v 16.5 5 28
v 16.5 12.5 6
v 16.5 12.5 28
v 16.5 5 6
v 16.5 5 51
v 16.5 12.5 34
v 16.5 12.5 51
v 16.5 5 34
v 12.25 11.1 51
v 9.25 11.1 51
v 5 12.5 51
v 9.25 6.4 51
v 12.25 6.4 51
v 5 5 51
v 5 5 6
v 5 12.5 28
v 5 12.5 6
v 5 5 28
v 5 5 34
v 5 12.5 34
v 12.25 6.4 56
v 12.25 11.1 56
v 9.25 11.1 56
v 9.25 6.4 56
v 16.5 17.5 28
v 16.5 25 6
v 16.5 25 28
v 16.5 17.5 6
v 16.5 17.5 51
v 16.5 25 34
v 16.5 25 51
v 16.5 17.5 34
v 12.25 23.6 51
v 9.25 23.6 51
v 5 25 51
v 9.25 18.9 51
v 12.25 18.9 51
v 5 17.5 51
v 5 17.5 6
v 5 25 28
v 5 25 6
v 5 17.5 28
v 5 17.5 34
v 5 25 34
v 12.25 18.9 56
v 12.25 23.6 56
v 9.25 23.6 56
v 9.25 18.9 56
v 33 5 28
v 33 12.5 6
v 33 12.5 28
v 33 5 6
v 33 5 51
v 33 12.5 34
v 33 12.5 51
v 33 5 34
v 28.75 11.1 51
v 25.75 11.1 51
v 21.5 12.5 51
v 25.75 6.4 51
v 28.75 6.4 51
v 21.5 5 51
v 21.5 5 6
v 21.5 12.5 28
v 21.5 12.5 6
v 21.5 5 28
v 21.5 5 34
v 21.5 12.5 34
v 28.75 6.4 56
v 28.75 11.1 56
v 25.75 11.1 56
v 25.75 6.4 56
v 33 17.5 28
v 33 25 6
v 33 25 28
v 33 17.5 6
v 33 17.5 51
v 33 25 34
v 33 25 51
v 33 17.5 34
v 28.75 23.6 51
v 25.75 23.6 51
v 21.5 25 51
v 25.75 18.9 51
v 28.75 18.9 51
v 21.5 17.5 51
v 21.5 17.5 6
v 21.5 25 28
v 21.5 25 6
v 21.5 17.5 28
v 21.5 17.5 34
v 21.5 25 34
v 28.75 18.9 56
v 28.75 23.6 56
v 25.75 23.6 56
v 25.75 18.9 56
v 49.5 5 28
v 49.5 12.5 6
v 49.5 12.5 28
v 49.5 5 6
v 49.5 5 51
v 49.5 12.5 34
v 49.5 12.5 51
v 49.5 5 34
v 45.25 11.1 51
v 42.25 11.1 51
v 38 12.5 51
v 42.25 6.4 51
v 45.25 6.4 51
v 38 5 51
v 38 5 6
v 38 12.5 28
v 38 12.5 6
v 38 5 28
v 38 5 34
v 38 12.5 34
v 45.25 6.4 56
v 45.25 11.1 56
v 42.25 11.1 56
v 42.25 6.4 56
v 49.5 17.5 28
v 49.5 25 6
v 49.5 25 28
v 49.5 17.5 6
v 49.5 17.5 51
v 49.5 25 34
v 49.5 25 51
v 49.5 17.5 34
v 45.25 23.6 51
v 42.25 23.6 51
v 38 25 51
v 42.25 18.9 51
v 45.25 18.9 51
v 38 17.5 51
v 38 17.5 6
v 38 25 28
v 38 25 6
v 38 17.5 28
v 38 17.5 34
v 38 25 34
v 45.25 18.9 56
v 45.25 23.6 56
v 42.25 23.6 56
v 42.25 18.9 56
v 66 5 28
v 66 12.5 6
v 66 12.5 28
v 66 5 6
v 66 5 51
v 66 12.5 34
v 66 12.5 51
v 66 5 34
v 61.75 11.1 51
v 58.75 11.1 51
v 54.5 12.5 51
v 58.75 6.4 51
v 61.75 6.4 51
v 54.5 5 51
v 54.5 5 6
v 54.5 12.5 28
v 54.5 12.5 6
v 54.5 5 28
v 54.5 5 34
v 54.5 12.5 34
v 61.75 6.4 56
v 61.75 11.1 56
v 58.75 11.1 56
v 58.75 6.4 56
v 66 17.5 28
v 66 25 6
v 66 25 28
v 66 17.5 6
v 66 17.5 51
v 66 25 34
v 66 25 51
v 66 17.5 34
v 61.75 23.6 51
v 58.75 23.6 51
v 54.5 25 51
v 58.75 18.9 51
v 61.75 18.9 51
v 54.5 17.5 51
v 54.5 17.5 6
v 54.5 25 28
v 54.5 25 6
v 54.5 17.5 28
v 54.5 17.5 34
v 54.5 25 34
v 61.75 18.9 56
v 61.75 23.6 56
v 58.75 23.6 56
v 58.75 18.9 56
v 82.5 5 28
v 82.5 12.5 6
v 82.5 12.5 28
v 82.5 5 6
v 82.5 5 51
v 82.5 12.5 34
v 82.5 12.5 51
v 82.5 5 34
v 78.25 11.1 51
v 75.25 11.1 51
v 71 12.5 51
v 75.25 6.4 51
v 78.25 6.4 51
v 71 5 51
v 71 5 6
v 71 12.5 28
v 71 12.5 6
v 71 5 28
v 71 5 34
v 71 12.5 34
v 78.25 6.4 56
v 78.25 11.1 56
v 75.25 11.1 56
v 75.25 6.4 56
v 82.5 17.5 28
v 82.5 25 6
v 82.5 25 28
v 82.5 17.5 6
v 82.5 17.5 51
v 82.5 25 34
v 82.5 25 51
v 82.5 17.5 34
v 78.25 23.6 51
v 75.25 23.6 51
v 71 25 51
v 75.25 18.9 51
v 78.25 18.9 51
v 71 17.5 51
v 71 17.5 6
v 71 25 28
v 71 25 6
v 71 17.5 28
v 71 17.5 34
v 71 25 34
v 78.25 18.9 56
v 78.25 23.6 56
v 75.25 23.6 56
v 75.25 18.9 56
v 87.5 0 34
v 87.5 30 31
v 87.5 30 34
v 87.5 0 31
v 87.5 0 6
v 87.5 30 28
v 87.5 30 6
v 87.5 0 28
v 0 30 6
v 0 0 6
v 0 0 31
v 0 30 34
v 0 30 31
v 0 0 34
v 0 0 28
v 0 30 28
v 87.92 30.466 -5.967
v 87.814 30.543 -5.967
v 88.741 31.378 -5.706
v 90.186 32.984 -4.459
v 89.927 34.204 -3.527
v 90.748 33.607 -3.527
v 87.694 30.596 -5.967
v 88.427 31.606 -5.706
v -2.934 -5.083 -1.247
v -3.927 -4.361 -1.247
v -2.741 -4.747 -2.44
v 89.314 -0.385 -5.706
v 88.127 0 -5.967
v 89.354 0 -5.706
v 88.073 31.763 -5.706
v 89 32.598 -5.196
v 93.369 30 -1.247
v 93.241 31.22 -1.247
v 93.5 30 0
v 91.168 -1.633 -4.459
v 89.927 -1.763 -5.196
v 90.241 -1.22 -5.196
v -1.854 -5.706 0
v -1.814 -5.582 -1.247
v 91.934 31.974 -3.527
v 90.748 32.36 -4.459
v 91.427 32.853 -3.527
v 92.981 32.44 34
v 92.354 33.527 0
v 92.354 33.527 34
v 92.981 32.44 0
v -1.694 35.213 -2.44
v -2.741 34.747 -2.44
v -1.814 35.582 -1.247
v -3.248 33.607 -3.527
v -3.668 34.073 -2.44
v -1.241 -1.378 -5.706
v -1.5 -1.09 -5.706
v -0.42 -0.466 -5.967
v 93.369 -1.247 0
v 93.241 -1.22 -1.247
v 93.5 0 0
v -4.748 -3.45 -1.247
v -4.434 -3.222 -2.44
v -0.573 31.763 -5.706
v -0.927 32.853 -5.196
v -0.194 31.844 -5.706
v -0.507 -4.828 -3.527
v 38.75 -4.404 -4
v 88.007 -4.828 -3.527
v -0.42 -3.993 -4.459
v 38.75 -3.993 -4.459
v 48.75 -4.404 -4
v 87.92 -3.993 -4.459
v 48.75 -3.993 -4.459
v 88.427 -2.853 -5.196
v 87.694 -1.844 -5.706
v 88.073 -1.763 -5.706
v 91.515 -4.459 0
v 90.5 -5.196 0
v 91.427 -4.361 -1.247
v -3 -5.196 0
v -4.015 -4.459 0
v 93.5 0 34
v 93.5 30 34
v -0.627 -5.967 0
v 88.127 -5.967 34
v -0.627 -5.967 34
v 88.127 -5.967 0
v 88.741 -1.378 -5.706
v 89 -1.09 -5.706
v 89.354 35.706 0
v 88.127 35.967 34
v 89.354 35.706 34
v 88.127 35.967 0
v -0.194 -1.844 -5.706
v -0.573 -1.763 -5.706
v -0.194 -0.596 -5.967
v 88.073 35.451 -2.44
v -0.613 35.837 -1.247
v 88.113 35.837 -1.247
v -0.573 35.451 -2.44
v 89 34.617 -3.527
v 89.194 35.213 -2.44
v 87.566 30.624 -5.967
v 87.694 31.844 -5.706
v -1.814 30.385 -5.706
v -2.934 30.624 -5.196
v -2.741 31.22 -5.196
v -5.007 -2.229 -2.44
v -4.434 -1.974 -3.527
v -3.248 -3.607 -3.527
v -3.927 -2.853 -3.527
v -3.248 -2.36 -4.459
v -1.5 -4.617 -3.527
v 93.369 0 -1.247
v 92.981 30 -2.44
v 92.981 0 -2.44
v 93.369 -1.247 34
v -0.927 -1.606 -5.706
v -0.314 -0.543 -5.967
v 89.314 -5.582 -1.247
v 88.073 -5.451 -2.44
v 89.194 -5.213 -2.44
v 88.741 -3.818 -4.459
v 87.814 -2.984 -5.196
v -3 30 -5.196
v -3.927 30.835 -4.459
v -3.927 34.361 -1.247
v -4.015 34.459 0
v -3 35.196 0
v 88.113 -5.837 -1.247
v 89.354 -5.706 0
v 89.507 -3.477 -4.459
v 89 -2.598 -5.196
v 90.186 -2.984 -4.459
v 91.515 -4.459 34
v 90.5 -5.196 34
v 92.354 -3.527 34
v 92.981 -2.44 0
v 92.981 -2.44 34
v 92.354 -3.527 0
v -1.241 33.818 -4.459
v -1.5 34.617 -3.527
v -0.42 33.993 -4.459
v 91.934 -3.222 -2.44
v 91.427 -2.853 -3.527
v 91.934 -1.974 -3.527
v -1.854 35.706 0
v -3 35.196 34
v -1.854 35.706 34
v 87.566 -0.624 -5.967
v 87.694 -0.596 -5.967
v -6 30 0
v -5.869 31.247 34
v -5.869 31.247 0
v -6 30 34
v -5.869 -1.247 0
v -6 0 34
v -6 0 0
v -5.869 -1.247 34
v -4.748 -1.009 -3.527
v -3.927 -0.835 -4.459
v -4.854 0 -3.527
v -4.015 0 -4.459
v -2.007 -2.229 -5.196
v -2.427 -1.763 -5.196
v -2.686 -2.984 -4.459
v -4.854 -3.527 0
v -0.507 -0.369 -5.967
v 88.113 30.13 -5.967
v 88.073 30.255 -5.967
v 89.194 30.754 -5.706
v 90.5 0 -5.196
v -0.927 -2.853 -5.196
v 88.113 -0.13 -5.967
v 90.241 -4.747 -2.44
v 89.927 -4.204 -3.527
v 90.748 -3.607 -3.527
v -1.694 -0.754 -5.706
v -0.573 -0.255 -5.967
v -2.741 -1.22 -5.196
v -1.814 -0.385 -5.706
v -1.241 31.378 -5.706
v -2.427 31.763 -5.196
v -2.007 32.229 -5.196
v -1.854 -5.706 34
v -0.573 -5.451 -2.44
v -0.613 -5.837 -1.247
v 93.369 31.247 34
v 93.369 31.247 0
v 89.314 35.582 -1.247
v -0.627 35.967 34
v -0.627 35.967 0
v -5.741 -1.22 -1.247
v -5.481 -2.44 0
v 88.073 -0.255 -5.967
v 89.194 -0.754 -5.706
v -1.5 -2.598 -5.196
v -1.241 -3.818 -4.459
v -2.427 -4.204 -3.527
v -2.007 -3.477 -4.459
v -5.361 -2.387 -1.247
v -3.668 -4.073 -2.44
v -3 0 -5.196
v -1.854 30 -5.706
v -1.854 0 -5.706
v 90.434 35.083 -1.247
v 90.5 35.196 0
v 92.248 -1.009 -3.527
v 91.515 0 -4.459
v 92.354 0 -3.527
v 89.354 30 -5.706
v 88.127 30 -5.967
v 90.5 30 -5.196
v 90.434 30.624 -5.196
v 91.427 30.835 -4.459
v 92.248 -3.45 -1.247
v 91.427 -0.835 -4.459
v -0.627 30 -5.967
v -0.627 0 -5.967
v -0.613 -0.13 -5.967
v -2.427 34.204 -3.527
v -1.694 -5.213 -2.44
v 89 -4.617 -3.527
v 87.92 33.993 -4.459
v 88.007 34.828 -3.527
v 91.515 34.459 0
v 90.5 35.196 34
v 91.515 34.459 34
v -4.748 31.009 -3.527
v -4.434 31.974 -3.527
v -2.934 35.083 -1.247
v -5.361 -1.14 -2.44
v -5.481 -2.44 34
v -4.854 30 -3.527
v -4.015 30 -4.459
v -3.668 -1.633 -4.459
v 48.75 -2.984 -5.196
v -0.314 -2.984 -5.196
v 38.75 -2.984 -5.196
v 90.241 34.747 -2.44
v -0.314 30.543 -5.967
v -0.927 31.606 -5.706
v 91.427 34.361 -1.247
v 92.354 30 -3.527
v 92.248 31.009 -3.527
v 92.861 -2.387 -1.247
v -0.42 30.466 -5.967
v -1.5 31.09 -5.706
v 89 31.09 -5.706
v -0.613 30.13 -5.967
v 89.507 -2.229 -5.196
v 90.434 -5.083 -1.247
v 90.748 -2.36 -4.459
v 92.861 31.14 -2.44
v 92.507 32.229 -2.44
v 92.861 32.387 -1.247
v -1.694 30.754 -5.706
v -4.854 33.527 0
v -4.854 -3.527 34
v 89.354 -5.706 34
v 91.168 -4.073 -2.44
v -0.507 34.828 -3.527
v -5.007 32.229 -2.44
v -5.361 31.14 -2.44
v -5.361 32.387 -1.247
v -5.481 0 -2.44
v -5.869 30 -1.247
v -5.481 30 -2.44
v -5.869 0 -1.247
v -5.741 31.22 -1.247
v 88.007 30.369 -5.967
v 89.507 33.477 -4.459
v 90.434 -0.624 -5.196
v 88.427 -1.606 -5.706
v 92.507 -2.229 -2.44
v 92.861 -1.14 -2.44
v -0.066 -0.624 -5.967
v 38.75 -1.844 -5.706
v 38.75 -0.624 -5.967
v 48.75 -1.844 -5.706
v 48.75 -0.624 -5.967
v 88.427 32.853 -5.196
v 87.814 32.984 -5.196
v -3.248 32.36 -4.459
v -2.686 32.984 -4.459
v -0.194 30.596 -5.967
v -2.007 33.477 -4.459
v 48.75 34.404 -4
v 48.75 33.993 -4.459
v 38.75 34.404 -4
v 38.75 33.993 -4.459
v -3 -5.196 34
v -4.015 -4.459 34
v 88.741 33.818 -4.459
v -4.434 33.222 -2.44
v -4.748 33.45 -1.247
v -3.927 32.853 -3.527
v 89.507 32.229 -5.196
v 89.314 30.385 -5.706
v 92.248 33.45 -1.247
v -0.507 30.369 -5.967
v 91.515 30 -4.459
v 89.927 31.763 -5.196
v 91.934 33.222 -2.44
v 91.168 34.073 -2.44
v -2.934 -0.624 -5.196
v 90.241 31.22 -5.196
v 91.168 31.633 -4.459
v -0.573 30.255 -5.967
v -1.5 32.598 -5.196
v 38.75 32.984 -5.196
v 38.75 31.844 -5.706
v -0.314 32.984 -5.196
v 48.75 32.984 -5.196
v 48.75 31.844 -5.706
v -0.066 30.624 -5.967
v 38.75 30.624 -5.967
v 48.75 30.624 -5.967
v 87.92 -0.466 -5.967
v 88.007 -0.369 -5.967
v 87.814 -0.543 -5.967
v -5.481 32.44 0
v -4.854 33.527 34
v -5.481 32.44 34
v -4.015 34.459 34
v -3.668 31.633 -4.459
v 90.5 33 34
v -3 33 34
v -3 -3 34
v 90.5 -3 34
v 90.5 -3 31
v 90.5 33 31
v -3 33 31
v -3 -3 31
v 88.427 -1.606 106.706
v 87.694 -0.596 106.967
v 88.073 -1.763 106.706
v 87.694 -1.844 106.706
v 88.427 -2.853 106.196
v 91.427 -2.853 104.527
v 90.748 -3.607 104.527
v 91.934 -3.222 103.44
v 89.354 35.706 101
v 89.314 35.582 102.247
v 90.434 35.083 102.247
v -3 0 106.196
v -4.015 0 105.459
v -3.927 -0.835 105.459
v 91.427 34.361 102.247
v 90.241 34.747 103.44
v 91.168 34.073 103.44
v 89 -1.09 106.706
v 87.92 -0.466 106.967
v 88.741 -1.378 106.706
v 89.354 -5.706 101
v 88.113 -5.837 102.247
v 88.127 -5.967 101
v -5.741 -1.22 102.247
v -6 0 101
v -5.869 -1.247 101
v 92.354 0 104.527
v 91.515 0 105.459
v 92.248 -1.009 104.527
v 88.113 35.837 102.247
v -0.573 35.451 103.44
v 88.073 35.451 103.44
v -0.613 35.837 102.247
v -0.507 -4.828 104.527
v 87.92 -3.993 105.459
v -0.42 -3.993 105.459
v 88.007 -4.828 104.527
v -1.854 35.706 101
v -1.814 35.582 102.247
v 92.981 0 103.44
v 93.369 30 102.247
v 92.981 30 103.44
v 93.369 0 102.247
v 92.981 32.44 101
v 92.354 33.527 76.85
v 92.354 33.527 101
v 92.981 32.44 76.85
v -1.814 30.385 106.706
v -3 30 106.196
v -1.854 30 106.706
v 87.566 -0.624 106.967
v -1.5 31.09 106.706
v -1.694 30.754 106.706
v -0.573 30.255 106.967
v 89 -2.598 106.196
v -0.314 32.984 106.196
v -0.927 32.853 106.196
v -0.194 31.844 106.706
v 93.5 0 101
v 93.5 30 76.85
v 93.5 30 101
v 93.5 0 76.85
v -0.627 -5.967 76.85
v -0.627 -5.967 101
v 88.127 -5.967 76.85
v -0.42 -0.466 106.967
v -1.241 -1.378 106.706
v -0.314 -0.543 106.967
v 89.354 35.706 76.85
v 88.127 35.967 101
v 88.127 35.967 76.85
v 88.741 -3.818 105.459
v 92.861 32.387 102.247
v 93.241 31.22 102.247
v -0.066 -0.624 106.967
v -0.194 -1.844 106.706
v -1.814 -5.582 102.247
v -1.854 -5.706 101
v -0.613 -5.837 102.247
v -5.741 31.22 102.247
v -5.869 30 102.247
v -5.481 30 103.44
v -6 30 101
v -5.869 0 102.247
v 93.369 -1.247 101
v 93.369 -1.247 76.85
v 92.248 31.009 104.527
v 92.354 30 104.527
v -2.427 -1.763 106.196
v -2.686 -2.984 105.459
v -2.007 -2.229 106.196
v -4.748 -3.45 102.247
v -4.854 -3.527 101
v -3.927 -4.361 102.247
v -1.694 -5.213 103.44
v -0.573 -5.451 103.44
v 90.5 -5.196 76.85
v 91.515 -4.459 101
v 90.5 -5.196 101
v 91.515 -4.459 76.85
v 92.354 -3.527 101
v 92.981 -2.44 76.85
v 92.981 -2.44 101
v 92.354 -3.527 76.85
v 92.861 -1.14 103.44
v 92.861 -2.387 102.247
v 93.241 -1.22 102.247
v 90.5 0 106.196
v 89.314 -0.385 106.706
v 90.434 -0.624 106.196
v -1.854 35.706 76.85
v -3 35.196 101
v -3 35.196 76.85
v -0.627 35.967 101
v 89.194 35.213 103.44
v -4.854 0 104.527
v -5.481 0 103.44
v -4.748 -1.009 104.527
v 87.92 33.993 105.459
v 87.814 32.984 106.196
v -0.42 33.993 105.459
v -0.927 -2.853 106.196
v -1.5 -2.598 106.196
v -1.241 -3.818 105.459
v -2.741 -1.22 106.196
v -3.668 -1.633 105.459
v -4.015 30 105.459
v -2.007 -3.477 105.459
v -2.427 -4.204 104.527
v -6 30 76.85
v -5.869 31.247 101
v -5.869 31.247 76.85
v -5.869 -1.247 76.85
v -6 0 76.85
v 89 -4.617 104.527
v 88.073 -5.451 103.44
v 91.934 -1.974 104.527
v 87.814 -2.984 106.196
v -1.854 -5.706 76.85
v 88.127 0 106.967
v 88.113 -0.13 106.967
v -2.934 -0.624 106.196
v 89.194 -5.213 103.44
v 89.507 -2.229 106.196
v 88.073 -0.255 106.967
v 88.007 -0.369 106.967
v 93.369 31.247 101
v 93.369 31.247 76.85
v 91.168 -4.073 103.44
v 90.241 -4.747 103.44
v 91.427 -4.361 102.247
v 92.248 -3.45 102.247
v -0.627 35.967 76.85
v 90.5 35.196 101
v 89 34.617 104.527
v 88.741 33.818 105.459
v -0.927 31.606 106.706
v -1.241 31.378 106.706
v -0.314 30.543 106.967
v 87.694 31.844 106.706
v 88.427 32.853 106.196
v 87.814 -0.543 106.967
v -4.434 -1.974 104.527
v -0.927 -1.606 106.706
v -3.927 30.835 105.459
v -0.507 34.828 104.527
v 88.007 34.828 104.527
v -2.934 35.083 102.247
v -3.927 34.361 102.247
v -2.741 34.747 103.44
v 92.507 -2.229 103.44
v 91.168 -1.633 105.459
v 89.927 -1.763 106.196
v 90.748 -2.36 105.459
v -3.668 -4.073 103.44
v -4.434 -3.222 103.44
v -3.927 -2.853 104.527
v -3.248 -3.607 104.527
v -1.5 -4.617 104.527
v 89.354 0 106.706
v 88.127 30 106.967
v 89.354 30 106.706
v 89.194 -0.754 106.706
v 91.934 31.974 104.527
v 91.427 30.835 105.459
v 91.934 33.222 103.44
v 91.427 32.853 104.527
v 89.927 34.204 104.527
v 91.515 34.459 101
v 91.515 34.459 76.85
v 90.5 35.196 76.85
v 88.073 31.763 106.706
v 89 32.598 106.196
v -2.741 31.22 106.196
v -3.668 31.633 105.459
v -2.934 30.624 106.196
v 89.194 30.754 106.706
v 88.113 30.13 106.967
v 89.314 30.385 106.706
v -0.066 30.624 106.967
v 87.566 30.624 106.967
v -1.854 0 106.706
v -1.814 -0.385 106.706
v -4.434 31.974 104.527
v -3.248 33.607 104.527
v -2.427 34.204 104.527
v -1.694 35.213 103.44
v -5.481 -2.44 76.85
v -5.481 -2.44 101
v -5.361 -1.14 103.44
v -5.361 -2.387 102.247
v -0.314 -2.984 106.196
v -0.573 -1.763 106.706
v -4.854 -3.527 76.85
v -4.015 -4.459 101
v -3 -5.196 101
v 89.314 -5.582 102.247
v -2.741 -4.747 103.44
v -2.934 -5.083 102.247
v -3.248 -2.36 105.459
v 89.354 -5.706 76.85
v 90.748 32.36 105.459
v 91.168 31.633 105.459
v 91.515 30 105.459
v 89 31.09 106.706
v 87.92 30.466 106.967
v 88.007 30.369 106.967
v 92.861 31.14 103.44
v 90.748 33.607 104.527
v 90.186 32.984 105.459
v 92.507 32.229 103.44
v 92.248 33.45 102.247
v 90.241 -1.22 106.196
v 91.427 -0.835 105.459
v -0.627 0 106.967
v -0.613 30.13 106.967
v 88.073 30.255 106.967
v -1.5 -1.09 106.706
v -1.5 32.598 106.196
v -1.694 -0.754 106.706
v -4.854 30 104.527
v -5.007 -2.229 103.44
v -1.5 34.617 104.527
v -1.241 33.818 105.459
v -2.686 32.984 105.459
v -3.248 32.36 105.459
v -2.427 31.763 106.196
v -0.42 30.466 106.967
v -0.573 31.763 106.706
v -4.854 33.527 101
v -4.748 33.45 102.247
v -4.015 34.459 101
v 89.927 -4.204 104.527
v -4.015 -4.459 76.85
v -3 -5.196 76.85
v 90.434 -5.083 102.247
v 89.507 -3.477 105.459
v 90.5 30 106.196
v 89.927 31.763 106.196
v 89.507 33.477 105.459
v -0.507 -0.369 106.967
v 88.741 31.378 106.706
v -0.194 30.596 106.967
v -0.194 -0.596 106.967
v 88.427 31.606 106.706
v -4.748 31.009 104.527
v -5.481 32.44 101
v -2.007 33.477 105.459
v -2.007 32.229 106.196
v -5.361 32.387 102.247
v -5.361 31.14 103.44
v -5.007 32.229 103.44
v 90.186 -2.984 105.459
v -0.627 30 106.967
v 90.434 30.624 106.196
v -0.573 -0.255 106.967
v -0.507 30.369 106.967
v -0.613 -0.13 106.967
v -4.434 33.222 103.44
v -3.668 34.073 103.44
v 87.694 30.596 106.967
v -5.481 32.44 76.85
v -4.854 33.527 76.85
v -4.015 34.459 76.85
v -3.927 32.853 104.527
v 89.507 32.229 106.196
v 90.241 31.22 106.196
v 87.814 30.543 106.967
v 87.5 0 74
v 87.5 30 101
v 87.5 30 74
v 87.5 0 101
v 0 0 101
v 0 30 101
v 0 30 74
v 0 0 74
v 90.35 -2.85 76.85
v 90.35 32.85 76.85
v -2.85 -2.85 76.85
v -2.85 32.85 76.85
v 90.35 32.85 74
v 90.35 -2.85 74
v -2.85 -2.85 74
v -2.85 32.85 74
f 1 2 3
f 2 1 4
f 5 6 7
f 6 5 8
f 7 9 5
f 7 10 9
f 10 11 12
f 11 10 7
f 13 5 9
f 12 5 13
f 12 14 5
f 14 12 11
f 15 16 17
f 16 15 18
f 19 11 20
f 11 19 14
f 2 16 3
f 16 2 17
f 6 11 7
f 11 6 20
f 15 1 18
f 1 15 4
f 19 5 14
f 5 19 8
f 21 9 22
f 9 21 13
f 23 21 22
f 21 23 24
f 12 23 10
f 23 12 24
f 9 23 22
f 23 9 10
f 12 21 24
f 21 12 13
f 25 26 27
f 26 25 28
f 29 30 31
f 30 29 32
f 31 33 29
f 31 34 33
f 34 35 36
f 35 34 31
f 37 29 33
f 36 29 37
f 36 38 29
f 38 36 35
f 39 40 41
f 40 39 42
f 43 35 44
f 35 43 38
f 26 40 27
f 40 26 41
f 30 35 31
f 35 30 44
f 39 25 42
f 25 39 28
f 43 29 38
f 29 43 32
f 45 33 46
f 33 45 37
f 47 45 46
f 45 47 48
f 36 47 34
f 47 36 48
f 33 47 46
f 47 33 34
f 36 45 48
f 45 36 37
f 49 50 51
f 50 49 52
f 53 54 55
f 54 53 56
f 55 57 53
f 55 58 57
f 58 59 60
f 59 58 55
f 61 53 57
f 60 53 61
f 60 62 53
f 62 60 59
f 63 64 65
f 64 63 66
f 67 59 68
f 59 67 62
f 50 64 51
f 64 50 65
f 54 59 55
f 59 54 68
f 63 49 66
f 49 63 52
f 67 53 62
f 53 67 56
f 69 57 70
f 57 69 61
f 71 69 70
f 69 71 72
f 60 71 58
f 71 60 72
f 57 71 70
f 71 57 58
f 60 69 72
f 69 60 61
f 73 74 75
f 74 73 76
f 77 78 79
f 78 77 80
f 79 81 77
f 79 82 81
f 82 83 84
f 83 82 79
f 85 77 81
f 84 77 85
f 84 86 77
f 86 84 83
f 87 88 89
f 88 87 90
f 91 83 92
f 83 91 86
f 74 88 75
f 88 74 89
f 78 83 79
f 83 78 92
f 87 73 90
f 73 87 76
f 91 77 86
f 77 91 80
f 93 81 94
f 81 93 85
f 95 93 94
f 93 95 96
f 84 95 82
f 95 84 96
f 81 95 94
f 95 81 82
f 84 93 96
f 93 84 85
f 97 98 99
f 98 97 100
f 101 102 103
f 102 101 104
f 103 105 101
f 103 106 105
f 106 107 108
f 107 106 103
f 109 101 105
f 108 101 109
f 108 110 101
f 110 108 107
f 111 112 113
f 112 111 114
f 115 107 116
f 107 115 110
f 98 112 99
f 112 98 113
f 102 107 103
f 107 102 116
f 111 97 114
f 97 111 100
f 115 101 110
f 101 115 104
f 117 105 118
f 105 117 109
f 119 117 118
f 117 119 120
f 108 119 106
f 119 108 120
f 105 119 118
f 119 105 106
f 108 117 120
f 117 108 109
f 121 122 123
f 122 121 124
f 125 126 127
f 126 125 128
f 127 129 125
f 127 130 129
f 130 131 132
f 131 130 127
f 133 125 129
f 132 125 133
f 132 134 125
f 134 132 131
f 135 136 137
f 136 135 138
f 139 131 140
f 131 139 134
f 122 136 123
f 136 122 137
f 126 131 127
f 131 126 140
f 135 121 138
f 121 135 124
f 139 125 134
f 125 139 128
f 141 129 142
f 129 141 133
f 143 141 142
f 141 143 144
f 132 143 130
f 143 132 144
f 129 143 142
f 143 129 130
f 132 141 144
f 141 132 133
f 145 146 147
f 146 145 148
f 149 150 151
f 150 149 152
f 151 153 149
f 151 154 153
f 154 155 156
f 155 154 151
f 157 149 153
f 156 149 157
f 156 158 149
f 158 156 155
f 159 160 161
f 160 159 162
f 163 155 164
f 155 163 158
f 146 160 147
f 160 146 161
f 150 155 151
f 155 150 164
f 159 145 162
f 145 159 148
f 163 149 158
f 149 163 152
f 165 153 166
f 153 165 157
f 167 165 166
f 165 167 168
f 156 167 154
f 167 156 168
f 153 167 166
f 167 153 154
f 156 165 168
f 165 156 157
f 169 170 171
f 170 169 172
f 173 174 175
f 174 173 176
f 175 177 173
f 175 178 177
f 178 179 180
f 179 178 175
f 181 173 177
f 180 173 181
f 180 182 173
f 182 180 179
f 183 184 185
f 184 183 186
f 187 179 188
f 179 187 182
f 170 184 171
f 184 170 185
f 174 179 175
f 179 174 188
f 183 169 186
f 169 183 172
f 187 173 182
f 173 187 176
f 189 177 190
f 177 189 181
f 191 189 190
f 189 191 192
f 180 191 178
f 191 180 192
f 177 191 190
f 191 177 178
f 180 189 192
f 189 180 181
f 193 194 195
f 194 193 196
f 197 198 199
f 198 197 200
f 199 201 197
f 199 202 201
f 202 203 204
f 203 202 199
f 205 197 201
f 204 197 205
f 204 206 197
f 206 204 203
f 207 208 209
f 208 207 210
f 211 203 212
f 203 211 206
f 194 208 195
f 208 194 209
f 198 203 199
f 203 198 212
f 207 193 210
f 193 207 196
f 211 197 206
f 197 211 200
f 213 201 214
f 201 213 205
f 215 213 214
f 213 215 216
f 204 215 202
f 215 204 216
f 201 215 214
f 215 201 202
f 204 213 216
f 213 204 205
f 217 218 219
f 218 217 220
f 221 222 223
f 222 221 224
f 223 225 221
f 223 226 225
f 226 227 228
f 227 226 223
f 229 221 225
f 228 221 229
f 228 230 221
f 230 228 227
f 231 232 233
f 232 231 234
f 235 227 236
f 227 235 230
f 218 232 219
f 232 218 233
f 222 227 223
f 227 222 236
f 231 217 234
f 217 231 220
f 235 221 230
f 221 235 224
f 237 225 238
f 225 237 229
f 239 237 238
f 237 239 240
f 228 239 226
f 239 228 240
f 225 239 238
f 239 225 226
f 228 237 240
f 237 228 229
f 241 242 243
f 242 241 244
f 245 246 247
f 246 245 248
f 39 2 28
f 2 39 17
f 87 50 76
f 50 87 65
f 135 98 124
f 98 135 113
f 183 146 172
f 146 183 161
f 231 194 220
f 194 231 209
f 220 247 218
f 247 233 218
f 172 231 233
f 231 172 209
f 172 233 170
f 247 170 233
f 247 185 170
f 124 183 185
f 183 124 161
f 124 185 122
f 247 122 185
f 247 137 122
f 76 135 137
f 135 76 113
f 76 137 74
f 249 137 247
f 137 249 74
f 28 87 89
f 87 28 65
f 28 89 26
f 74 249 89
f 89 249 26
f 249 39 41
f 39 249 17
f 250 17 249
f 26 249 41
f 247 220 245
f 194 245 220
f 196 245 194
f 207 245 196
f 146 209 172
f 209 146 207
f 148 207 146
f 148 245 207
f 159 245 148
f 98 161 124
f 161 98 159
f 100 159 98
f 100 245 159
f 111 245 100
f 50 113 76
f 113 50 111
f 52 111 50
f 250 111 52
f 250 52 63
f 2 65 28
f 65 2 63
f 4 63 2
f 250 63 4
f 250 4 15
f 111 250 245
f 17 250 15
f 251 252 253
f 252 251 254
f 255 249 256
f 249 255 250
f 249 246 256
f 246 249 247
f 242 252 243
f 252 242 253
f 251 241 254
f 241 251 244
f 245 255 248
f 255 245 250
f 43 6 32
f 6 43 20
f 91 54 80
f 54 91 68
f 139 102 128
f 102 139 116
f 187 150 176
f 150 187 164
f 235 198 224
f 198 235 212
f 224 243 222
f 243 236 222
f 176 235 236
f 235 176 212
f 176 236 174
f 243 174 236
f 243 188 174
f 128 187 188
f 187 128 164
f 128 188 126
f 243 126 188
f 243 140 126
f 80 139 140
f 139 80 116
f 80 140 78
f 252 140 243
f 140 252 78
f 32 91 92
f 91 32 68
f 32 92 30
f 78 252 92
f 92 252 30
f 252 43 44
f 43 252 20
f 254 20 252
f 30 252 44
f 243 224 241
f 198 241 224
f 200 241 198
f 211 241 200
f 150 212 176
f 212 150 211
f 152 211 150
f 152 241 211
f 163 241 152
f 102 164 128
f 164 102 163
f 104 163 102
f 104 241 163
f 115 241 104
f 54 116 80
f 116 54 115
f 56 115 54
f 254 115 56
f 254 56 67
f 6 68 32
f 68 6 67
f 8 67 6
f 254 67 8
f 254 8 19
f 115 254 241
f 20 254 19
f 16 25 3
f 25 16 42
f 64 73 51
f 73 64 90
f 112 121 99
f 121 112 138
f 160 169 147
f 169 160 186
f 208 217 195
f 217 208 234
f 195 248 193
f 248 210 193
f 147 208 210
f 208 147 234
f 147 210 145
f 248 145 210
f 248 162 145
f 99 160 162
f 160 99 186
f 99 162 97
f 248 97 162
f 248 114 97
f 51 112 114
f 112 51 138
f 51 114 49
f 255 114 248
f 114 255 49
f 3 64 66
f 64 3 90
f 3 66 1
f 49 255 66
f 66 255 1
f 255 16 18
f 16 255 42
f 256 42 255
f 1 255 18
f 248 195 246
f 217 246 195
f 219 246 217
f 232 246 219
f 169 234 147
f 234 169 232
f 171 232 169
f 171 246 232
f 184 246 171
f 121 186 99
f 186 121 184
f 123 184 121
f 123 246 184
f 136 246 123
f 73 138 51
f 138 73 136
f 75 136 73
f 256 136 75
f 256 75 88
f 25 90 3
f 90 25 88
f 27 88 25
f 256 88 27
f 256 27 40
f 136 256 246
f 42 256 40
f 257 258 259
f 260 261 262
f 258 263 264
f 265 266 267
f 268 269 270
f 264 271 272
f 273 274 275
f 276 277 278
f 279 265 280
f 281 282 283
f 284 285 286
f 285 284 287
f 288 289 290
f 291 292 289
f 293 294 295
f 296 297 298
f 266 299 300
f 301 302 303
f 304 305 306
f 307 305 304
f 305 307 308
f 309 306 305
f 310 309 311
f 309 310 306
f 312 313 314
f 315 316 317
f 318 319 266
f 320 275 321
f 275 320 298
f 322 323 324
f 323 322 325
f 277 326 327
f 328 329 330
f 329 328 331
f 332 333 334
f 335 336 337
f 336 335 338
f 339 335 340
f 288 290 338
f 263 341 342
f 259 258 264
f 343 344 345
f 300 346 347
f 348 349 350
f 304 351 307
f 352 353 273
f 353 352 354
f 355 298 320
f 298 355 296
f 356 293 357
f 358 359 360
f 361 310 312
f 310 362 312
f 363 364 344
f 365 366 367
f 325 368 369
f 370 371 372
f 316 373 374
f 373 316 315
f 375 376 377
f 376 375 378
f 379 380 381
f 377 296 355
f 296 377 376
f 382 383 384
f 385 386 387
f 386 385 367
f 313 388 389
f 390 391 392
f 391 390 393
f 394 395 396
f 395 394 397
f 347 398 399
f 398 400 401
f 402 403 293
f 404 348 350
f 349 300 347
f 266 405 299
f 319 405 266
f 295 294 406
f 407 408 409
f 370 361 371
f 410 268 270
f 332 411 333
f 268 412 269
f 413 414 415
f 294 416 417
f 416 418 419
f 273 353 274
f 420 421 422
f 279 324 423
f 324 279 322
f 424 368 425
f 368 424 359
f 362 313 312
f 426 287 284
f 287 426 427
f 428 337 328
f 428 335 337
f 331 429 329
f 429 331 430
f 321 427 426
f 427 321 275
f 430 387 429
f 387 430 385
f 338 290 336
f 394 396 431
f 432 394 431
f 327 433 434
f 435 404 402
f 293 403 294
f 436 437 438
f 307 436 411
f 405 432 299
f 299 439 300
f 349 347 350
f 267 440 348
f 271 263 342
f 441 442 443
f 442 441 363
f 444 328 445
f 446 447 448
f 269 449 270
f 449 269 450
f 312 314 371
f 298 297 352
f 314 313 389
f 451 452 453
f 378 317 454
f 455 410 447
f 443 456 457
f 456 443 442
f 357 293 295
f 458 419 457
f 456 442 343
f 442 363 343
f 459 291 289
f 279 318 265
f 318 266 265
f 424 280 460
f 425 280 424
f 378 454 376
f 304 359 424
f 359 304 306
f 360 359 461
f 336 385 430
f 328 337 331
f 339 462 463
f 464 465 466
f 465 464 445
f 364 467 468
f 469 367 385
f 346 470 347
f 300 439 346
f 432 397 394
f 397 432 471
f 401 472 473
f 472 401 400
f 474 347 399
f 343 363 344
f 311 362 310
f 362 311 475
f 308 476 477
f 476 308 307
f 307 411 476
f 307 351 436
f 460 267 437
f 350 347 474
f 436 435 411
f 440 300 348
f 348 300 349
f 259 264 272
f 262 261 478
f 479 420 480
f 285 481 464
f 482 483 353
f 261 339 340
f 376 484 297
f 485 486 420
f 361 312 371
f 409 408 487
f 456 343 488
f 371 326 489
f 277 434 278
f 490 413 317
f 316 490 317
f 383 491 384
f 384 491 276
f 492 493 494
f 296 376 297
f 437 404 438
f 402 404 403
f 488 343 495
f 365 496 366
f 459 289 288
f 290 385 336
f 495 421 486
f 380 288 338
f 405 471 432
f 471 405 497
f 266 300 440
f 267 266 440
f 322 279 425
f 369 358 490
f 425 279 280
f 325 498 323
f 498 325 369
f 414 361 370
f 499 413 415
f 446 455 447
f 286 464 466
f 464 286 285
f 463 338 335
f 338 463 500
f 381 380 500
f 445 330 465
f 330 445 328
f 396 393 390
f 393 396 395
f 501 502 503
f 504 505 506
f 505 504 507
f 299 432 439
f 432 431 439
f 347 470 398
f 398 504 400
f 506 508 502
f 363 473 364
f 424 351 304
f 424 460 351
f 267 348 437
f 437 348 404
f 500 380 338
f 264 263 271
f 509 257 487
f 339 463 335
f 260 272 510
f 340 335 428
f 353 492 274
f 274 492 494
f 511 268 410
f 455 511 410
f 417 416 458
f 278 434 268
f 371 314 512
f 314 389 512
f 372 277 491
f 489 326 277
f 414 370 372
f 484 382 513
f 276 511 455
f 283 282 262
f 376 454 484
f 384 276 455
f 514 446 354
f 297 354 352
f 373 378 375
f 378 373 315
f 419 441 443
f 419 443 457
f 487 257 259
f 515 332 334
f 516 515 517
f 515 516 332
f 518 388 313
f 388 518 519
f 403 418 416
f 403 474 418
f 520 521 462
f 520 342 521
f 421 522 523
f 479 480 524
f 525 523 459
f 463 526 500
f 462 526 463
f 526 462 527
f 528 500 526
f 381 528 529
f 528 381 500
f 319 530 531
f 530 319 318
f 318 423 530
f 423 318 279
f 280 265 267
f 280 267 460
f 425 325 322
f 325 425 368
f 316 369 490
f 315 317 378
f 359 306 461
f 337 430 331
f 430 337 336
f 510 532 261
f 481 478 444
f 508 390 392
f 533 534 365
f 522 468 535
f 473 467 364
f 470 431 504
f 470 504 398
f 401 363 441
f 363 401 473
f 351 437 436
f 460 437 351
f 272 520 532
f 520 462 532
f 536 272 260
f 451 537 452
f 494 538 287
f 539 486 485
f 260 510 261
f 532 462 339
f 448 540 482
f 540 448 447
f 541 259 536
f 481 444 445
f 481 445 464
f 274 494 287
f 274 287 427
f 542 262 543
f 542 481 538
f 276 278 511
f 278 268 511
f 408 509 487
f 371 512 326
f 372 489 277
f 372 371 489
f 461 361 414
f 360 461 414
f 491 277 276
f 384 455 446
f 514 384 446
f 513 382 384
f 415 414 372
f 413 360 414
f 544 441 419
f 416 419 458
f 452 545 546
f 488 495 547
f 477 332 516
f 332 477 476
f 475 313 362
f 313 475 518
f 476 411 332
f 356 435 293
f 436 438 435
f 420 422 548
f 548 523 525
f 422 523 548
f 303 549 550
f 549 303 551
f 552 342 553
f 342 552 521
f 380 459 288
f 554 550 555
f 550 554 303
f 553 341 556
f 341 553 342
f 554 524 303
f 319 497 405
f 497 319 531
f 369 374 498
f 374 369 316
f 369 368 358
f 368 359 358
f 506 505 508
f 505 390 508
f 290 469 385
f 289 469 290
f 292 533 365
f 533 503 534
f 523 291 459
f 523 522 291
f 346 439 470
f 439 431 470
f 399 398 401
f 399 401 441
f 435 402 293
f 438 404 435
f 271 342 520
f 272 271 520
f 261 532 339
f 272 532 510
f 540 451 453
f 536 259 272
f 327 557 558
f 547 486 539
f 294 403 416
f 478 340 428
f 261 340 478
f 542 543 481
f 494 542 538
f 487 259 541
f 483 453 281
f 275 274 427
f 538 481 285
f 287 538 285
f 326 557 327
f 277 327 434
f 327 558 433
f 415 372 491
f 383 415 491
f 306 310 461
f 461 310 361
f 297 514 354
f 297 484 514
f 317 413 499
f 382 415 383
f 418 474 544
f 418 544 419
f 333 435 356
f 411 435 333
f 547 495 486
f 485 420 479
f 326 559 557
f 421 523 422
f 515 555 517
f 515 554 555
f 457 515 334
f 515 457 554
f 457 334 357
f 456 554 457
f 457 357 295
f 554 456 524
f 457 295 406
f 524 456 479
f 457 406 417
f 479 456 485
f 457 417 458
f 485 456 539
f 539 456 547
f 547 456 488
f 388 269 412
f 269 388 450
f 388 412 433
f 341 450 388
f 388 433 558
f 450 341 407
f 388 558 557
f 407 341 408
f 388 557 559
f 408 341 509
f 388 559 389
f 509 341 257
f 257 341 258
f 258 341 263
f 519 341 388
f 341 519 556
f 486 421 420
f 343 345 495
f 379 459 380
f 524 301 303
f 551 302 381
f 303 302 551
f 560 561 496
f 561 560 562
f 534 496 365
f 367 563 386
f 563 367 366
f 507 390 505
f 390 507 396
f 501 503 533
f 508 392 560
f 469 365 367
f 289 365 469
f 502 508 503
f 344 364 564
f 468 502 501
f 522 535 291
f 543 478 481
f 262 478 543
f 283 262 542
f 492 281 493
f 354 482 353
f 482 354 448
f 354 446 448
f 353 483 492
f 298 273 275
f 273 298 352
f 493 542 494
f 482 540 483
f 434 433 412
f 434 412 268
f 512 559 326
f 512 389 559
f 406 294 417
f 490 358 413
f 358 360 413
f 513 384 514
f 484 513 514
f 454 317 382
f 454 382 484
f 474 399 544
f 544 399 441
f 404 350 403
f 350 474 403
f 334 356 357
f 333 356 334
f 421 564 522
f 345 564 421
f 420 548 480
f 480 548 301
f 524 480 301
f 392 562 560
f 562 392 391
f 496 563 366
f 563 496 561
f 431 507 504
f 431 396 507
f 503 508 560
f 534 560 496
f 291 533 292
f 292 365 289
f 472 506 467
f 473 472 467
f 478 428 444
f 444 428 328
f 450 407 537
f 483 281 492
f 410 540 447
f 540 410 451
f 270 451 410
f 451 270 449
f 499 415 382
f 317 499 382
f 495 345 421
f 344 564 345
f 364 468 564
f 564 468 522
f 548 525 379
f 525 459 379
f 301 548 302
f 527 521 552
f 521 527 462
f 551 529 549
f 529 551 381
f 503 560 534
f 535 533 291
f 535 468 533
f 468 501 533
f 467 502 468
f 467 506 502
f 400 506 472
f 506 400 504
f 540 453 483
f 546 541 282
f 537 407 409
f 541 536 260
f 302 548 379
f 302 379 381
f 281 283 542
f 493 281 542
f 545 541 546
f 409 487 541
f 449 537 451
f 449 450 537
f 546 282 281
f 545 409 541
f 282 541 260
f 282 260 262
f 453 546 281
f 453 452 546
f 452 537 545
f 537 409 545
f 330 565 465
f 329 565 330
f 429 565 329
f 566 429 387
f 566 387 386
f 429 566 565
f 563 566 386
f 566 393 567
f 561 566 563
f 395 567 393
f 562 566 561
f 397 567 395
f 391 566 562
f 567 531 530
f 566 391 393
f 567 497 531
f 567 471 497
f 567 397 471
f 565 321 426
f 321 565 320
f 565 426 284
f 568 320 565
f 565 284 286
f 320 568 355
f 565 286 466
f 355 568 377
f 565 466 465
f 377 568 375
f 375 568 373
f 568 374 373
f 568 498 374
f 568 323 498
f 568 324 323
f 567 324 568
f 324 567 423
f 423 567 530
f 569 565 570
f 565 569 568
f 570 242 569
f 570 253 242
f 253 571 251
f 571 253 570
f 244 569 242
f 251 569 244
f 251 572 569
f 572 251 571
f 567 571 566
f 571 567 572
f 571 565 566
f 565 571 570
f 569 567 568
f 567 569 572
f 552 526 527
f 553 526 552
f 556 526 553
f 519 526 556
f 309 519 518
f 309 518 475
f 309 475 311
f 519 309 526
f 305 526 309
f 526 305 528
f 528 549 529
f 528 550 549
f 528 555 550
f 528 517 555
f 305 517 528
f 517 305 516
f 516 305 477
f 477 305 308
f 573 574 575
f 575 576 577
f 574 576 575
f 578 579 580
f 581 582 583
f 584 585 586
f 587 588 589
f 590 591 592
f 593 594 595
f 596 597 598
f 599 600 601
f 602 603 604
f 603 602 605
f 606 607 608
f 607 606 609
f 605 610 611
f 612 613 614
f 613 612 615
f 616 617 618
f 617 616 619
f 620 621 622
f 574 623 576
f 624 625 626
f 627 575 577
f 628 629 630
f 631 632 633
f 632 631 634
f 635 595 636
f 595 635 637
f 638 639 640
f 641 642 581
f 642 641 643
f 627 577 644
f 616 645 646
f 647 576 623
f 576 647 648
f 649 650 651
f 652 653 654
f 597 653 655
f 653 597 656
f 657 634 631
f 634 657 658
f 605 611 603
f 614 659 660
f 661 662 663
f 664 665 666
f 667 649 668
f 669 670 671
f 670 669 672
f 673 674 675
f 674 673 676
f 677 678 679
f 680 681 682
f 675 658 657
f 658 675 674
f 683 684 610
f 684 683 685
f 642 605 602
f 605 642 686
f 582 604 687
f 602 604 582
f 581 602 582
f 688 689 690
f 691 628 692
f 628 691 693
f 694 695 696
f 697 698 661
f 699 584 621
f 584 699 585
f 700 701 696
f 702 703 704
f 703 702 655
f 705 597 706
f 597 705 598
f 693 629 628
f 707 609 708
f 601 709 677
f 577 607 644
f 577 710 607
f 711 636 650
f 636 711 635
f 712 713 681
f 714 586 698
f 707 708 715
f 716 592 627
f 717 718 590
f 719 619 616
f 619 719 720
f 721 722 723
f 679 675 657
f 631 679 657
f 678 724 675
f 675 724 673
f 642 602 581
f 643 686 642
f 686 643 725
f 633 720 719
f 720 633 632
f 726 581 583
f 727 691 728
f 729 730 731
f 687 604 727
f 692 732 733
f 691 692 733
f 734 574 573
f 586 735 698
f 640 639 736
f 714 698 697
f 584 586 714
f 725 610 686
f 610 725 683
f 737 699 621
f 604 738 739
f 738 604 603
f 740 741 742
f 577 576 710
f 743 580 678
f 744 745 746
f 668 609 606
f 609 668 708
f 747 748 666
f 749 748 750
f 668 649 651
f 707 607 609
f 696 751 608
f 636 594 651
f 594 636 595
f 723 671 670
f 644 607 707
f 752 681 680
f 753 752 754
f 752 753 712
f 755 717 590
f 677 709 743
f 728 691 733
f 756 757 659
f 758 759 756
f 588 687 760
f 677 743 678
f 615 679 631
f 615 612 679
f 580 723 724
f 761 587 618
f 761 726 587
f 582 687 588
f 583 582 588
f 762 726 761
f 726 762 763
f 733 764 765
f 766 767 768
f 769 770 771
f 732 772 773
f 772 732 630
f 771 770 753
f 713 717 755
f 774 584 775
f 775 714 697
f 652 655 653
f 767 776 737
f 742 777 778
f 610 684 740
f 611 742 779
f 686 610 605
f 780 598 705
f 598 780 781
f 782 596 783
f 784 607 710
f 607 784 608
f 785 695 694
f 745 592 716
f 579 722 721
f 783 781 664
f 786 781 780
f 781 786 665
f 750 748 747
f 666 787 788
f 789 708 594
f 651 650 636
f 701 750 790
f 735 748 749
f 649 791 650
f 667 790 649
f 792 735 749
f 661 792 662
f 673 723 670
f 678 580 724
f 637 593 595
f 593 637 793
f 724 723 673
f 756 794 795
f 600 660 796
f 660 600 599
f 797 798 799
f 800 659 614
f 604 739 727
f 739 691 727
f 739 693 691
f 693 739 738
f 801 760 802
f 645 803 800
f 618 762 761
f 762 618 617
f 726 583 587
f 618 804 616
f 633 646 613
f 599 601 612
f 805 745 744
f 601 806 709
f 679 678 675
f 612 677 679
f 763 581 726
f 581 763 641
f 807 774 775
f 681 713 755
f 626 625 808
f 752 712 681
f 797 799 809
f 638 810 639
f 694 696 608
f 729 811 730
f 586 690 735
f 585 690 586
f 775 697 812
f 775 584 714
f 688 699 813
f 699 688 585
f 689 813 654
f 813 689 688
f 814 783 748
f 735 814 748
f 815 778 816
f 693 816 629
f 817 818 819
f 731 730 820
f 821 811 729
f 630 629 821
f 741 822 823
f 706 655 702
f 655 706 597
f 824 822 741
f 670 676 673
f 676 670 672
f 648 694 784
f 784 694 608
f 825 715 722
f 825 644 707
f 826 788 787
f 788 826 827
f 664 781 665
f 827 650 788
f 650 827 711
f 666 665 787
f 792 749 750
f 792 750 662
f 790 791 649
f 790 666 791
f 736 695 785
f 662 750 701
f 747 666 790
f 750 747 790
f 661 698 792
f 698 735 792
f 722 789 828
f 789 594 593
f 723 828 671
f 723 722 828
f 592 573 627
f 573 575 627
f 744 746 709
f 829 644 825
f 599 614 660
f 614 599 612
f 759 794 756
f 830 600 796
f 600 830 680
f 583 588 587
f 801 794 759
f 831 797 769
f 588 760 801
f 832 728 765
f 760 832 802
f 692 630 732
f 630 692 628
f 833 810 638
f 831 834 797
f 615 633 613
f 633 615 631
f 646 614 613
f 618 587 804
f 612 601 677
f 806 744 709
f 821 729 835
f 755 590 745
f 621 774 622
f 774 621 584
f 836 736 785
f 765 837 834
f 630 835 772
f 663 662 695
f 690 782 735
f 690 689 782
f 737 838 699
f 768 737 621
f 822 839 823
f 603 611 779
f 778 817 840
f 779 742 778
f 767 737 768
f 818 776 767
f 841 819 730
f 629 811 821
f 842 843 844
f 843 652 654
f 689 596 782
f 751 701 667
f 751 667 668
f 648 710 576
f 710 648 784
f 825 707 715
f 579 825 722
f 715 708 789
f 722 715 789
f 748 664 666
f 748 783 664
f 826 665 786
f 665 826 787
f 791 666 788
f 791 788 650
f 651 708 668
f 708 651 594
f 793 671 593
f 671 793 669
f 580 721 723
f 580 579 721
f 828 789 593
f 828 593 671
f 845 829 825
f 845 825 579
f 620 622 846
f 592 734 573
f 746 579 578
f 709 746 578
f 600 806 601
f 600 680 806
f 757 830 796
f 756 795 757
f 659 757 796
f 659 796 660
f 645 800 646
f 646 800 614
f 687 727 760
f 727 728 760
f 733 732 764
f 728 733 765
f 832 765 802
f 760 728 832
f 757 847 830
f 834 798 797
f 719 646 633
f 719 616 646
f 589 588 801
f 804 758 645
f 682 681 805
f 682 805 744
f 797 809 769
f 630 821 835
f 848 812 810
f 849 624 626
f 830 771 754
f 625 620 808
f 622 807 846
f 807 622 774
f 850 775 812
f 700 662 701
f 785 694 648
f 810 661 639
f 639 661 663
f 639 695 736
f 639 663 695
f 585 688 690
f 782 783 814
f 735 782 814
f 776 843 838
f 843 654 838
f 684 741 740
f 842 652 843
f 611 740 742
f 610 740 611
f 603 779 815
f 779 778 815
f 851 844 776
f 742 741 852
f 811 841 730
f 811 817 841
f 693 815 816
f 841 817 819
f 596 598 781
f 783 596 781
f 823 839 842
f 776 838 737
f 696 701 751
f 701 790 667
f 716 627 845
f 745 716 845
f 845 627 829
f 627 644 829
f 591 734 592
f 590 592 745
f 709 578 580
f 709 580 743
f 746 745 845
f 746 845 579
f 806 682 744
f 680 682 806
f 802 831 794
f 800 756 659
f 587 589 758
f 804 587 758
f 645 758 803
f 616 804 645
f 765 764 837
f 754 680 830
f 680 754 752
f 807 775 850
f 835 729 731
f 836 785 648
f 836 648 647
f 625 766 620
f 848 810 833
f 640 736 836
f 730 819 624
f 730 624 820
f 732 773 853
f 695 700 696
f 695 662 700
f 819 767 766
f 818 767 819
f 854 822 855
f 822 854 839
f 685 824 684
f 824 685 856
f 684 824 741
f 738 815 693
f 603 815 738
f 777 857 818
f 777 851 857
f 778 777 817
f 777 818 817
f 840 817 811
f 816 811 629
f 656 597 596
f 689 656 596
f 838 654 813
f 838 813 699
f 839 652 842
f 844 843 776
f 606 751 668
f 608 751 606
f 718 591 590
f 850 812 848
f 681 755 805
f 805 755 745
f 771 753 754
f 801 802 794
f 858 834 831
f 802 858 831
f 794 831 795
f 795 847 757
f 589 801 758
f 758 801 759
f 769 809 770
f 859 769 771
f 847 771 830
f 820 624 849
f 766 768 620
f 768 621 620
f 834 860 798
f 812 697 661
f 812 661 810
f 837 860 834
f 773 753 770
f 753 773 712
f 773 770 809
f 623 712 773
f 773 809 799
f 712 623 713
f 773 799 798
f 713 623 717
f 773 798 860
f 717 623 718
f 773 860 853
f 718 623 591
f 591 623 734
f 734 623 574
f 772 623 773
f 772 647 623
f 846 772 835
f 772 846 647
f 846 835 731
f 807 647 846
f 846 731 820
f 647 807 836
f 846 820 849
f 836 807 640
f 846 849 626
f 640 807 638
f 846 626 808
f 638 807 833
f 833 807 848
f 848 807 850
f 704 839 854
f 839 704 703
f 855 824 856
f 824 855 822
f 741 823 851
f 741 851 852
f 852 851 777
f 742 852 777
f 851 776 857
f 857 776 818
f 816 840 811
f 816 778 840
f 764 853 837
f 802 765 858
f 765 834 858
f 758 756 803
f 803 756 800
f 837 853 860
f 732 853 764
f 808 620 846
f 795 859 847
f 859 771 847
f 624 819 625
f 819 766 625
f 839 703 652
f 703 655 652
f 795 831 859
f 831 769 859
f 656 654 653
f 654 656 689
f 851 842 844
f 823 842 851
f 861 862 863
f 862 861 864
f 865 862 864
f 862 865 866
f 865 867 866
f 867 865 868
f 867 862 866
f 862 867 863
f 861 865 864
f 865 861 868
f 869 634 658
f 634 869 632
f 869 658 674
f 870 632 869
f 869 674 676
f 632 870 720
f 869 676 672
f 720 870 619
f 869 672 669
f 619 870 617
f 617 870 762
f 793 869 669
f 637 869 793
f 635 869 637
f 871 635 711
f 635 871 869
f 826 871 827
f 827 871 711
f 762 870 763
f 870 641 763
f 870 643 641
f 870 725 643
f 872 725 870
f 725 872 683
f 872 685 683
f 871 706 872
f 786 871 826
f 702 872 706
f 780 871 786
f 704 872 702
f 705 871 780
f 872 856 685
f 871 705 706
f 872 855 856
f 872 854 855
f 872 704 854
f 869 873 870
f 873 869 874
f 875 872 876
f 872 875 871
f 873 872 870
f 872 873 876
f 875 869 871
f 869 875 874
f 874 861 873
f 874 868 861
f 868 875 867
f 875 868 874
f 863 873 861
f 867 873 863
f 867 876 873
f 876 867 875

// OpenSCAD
translate ([5.0, 5.0, 0]) {
  translate ([5.75, 3.75, 51/2]) {
    union () {
      cube ([11.5, 7.5, 51], center=true);
      translate ([0, 0, 28]) {
        cube ([3, 4.7, 5], center=true);
      }
    }
  }
}
translate ([5.0, 17.5, 0]) {
  translate ([5.75, 3.75, 51/2]) {
    union () {
      cube ([11.5, 7.5, 51], center=true);
      translate ([0, 0, 28]) {
        cube ([3, 4.7, 5], center=true);
      }
    }
  }
}
translate ([21.5, 5.0, 0]) {
  translate ([5.75, 3.75, 51/2]) {
    union () {
      cube ([11.5, 7.5, 51], center=true);
      translate ([0, 0, 28]) {
        cube ([3, 4.7, 5], center=true);
      }
    }
  }
}
translate ([21.5, 17.5, 0]) {
  translate ([5.75, 3.75, 51/2]) {
    union () {
      cube ([11.5, 7.5, 51], center=true);
      translate ([0, 0, 28]) {
        cube ([3, 4.7, 5], center=true);
      }
    }
  }
}
translate ([38.0, 5.0, 0]) {
  translate ([5.75, 3.75, 51/2]) {
    union () {
      cube ([11.5, 7.5, 51], center=true);
      translate ([0, 0, 28]) {
        cube ([3, 4.7, 5], center=true);
      }
    }
  }
}
translate ([38.0, 17.5, 0]) {
  translate ([5.75, 3.75, 51/2]) {
    union () {
      cube ([11.5, 7.5, 51], center=true);
      translate ([0, 0, 28]) {
        cube ([3, 4.7, 5], center=true);
      }
    }
  }
}
translate ([54.5, 5.0, 0]) {
  translate ([5.75, 3.75, 51/2]) {
    union () {
      cube ([11.5, 7.5, 51], center=true);
      translate ([0, 0, 28]) {
        cube ([3, 4.7, 5], center=true);
      }
    }
  }
}
translate ([54.5, 17.5, 0]) {
  translate ([5.75, 3.75, 51/2]) {
    union () {
      cube ([11.5, 7.5, 51], center=true);
      translate ([0, 0, 28]) {
        cube ([3, 4.7, 5], center=true);
      }
    }
  }
}
translate ([71.0, 5.0, 0]) {
  translate ([5.75, 3.75, 51/2]) {
    union () {
      cube ([11.5, 7.5, 51], center=true);
      translate ([0, 0, 28]) {
        cube ([3, 4.7, 5], center=true);
      }
    }
  }
}
translate ([71.0, 17.5, 0]) {
  translate ([5.75, 3.75, 51/2]) {
    union () {
      cube ([11.5, 7.5, 51], center=true);
      translate ([0, 0, 28]) {
        cube ([3, 4.7, 5], center=true);
      }
    }
  }
}
color ([0, 0, 1, ]) {
  difference () {
    translate ([43.75, 15.0, 3]) {
      cube ([87.5, 30.0, 6], center=true);
    }
    translate ([5.0, 5.0, 0]) {
      translate ([5.75, 3.75, 0]) {
        cube ([11.5, 7.5, 1000], center=true);
      }
    }
    translate ([5.0, 17.5, 0]) {
      translate ([5.75, 3.75, 0]) {
        cube ([11.5, 7.5, 1000], center=true);
      }
    }
    translate ([21.5, 5.0, 0]) {
      translate ([5.75, 3.75, 0]) {
        cube ([11.5, 7.5, 1000], center=true);
      }
    }
    translate ([21.5, 17.5, 0]) {
      translate ([5.75, 3.75, 0]) {
        cube ([11.5, 7.5, 1000], center=true);
      }
    }
    translate ([38.0, 5.0, 0]) {
      translate ([5.75, 3.75, 0]) {
        cube ([11.5, 7.5, 1000], center=true);
      }
    }
    translate ([38.0, 17.5, 0]) {
      translate ([5.75, 3.75, 0]) {
        cube ([11.5, 7.5, 1000], center=true);
      }
    }
    translate ([54.5, 5.0, 0]) {
      translate ([5.75, 3.75, 0]) {
        cube ([11.5, 7.5, 1000], center=true);
      }
    }
    translate ([54.5, 17.5, 0]) {
      translate ([5.75, 3.75, 0]) {
        cube ([11.5, 7.5, 1000], center=true);
      }
    }
    translate ([71.0, 5.0, 0]) {
      translate ([5.75, 3.75, 0]) {
        cube ([11.5, 7.5, 1000], center=true);
      }
    }
    translate ([71.0, 17.5, 0]) {
      translate ([5.75, 3.75, 0]) {
        cube ([11.5, 7.5, 1000], center=true);
      }
    }
  }
}
color ([0, 0, 1, ]) {
  translate ([0, 0, 28]) {
    difference () {
      translate ([43.75, 15.0, 3]) {
        cube ([87.5, 30.0, 6], center=true);
      }
      translate ([5.0, 5.0, 0]) {
        translate ([5.75, 3.75, 0]) {
          cube ([11.5, 7.5, 1000], center=true);
        }
      }
      translate ([5.0, 17.5, 0]) {
        translate ([5.75, 3.75, 0]) {
          cube ([11.5, 7.5, 1000], center=true);
        }
      }
      translate ([21.5, 5.0, 0]) {
        translate ([5.75, 3.75, 0]) {
          cube ([11.5, 7.5, 1000], center=true);
        }
      }
      translate ([21.5, 17.5, 0]) {
        translate ([5.75, 3.75, 0]) {
          cube ([11.5, 7.5, 1000], center=true);
        }
      }
      translate ([38.0, 5.0, 0]) {
        translate ([5.75, 3.75, 0]) {
          cube ([11.5, 7.5, 1000], center=true);
        }
      }
      translate ([38.0, 17.5, 0]) {
        translate ([5.75, 3.75, 0]) {
          cube ([11.5, 7.5, 1000], center=true);
        }
      }
      translate ([54.5, 5.0, 0]) {
        translate ([5.75, 3.75, 0]) {
          cube ([11.5, 7.5, 1000], center=true);
        }
      }
      translate ([54.5, 17.5, 0]) {
        translate ([5.75, 3.75, 0]) {
          cube ([11.5, 7.5, 1000], center=true);
        }
      }
      translate ([71.0, 5.0, 0]) {
        translate ([5.75, 3.75, 0]) {
          cube ([11.5, 7.5, 1000], center=true);
        }
      }
      translate ([71.0, 17.5, 0]) {
        translate ([5.75, 3.75, 0]) {
          cube ([11.5, 7.5, 1000], center=true);
        }
      }
    }
  }
}
color ([1, 0, 0, ]) {
  difference () {
    translate ([43.75, 15.0, 61/2]) {
      difference () {
        minkowski () {
          cube ([87.5, 30.0, 61], center=true);
          sphere ($fn=30, r=6);
        }
        cube ([87.5, 30.0, 61], center=true);
      }
    }
    union () {
      translate ([0, 0, 134]) {
        cube ([200, 200, 200], center=true);
      }
      translate ([43.75, 15.0, 134]) {
        cube ([93.5, 36.0, 206], center=true);
      }
    }
    translate ([43.75, 0, -5]) {
      cube ([10, 1000, 2], center=true);
    }
  }
}
color ([1, 0, 0, ]) {
  translate ([0, 0, 40]) {
    difference () {
      translate ([43.75, 15.0, 61/2]) {
        difference () {
          minkowski () {
            cube ([87.5, 30.0, 61], center=true);
            sphere ($fn=30, r=6);
          }
          cube ([87.5, 30.0, 61], center=true);
        }
      }
      translate ([0, 0, -66]) {
        cube ([200, 200, 200], center=true);
      }
      translate ([43.74999999999999, 15.000000000000002, -63.15]) {
        difference () {
          cube ([300, 300, 200], center=true);
          cube ([93.19999999999999, 35.7, 300], center=true);
        }
      }
    }
  }
}
